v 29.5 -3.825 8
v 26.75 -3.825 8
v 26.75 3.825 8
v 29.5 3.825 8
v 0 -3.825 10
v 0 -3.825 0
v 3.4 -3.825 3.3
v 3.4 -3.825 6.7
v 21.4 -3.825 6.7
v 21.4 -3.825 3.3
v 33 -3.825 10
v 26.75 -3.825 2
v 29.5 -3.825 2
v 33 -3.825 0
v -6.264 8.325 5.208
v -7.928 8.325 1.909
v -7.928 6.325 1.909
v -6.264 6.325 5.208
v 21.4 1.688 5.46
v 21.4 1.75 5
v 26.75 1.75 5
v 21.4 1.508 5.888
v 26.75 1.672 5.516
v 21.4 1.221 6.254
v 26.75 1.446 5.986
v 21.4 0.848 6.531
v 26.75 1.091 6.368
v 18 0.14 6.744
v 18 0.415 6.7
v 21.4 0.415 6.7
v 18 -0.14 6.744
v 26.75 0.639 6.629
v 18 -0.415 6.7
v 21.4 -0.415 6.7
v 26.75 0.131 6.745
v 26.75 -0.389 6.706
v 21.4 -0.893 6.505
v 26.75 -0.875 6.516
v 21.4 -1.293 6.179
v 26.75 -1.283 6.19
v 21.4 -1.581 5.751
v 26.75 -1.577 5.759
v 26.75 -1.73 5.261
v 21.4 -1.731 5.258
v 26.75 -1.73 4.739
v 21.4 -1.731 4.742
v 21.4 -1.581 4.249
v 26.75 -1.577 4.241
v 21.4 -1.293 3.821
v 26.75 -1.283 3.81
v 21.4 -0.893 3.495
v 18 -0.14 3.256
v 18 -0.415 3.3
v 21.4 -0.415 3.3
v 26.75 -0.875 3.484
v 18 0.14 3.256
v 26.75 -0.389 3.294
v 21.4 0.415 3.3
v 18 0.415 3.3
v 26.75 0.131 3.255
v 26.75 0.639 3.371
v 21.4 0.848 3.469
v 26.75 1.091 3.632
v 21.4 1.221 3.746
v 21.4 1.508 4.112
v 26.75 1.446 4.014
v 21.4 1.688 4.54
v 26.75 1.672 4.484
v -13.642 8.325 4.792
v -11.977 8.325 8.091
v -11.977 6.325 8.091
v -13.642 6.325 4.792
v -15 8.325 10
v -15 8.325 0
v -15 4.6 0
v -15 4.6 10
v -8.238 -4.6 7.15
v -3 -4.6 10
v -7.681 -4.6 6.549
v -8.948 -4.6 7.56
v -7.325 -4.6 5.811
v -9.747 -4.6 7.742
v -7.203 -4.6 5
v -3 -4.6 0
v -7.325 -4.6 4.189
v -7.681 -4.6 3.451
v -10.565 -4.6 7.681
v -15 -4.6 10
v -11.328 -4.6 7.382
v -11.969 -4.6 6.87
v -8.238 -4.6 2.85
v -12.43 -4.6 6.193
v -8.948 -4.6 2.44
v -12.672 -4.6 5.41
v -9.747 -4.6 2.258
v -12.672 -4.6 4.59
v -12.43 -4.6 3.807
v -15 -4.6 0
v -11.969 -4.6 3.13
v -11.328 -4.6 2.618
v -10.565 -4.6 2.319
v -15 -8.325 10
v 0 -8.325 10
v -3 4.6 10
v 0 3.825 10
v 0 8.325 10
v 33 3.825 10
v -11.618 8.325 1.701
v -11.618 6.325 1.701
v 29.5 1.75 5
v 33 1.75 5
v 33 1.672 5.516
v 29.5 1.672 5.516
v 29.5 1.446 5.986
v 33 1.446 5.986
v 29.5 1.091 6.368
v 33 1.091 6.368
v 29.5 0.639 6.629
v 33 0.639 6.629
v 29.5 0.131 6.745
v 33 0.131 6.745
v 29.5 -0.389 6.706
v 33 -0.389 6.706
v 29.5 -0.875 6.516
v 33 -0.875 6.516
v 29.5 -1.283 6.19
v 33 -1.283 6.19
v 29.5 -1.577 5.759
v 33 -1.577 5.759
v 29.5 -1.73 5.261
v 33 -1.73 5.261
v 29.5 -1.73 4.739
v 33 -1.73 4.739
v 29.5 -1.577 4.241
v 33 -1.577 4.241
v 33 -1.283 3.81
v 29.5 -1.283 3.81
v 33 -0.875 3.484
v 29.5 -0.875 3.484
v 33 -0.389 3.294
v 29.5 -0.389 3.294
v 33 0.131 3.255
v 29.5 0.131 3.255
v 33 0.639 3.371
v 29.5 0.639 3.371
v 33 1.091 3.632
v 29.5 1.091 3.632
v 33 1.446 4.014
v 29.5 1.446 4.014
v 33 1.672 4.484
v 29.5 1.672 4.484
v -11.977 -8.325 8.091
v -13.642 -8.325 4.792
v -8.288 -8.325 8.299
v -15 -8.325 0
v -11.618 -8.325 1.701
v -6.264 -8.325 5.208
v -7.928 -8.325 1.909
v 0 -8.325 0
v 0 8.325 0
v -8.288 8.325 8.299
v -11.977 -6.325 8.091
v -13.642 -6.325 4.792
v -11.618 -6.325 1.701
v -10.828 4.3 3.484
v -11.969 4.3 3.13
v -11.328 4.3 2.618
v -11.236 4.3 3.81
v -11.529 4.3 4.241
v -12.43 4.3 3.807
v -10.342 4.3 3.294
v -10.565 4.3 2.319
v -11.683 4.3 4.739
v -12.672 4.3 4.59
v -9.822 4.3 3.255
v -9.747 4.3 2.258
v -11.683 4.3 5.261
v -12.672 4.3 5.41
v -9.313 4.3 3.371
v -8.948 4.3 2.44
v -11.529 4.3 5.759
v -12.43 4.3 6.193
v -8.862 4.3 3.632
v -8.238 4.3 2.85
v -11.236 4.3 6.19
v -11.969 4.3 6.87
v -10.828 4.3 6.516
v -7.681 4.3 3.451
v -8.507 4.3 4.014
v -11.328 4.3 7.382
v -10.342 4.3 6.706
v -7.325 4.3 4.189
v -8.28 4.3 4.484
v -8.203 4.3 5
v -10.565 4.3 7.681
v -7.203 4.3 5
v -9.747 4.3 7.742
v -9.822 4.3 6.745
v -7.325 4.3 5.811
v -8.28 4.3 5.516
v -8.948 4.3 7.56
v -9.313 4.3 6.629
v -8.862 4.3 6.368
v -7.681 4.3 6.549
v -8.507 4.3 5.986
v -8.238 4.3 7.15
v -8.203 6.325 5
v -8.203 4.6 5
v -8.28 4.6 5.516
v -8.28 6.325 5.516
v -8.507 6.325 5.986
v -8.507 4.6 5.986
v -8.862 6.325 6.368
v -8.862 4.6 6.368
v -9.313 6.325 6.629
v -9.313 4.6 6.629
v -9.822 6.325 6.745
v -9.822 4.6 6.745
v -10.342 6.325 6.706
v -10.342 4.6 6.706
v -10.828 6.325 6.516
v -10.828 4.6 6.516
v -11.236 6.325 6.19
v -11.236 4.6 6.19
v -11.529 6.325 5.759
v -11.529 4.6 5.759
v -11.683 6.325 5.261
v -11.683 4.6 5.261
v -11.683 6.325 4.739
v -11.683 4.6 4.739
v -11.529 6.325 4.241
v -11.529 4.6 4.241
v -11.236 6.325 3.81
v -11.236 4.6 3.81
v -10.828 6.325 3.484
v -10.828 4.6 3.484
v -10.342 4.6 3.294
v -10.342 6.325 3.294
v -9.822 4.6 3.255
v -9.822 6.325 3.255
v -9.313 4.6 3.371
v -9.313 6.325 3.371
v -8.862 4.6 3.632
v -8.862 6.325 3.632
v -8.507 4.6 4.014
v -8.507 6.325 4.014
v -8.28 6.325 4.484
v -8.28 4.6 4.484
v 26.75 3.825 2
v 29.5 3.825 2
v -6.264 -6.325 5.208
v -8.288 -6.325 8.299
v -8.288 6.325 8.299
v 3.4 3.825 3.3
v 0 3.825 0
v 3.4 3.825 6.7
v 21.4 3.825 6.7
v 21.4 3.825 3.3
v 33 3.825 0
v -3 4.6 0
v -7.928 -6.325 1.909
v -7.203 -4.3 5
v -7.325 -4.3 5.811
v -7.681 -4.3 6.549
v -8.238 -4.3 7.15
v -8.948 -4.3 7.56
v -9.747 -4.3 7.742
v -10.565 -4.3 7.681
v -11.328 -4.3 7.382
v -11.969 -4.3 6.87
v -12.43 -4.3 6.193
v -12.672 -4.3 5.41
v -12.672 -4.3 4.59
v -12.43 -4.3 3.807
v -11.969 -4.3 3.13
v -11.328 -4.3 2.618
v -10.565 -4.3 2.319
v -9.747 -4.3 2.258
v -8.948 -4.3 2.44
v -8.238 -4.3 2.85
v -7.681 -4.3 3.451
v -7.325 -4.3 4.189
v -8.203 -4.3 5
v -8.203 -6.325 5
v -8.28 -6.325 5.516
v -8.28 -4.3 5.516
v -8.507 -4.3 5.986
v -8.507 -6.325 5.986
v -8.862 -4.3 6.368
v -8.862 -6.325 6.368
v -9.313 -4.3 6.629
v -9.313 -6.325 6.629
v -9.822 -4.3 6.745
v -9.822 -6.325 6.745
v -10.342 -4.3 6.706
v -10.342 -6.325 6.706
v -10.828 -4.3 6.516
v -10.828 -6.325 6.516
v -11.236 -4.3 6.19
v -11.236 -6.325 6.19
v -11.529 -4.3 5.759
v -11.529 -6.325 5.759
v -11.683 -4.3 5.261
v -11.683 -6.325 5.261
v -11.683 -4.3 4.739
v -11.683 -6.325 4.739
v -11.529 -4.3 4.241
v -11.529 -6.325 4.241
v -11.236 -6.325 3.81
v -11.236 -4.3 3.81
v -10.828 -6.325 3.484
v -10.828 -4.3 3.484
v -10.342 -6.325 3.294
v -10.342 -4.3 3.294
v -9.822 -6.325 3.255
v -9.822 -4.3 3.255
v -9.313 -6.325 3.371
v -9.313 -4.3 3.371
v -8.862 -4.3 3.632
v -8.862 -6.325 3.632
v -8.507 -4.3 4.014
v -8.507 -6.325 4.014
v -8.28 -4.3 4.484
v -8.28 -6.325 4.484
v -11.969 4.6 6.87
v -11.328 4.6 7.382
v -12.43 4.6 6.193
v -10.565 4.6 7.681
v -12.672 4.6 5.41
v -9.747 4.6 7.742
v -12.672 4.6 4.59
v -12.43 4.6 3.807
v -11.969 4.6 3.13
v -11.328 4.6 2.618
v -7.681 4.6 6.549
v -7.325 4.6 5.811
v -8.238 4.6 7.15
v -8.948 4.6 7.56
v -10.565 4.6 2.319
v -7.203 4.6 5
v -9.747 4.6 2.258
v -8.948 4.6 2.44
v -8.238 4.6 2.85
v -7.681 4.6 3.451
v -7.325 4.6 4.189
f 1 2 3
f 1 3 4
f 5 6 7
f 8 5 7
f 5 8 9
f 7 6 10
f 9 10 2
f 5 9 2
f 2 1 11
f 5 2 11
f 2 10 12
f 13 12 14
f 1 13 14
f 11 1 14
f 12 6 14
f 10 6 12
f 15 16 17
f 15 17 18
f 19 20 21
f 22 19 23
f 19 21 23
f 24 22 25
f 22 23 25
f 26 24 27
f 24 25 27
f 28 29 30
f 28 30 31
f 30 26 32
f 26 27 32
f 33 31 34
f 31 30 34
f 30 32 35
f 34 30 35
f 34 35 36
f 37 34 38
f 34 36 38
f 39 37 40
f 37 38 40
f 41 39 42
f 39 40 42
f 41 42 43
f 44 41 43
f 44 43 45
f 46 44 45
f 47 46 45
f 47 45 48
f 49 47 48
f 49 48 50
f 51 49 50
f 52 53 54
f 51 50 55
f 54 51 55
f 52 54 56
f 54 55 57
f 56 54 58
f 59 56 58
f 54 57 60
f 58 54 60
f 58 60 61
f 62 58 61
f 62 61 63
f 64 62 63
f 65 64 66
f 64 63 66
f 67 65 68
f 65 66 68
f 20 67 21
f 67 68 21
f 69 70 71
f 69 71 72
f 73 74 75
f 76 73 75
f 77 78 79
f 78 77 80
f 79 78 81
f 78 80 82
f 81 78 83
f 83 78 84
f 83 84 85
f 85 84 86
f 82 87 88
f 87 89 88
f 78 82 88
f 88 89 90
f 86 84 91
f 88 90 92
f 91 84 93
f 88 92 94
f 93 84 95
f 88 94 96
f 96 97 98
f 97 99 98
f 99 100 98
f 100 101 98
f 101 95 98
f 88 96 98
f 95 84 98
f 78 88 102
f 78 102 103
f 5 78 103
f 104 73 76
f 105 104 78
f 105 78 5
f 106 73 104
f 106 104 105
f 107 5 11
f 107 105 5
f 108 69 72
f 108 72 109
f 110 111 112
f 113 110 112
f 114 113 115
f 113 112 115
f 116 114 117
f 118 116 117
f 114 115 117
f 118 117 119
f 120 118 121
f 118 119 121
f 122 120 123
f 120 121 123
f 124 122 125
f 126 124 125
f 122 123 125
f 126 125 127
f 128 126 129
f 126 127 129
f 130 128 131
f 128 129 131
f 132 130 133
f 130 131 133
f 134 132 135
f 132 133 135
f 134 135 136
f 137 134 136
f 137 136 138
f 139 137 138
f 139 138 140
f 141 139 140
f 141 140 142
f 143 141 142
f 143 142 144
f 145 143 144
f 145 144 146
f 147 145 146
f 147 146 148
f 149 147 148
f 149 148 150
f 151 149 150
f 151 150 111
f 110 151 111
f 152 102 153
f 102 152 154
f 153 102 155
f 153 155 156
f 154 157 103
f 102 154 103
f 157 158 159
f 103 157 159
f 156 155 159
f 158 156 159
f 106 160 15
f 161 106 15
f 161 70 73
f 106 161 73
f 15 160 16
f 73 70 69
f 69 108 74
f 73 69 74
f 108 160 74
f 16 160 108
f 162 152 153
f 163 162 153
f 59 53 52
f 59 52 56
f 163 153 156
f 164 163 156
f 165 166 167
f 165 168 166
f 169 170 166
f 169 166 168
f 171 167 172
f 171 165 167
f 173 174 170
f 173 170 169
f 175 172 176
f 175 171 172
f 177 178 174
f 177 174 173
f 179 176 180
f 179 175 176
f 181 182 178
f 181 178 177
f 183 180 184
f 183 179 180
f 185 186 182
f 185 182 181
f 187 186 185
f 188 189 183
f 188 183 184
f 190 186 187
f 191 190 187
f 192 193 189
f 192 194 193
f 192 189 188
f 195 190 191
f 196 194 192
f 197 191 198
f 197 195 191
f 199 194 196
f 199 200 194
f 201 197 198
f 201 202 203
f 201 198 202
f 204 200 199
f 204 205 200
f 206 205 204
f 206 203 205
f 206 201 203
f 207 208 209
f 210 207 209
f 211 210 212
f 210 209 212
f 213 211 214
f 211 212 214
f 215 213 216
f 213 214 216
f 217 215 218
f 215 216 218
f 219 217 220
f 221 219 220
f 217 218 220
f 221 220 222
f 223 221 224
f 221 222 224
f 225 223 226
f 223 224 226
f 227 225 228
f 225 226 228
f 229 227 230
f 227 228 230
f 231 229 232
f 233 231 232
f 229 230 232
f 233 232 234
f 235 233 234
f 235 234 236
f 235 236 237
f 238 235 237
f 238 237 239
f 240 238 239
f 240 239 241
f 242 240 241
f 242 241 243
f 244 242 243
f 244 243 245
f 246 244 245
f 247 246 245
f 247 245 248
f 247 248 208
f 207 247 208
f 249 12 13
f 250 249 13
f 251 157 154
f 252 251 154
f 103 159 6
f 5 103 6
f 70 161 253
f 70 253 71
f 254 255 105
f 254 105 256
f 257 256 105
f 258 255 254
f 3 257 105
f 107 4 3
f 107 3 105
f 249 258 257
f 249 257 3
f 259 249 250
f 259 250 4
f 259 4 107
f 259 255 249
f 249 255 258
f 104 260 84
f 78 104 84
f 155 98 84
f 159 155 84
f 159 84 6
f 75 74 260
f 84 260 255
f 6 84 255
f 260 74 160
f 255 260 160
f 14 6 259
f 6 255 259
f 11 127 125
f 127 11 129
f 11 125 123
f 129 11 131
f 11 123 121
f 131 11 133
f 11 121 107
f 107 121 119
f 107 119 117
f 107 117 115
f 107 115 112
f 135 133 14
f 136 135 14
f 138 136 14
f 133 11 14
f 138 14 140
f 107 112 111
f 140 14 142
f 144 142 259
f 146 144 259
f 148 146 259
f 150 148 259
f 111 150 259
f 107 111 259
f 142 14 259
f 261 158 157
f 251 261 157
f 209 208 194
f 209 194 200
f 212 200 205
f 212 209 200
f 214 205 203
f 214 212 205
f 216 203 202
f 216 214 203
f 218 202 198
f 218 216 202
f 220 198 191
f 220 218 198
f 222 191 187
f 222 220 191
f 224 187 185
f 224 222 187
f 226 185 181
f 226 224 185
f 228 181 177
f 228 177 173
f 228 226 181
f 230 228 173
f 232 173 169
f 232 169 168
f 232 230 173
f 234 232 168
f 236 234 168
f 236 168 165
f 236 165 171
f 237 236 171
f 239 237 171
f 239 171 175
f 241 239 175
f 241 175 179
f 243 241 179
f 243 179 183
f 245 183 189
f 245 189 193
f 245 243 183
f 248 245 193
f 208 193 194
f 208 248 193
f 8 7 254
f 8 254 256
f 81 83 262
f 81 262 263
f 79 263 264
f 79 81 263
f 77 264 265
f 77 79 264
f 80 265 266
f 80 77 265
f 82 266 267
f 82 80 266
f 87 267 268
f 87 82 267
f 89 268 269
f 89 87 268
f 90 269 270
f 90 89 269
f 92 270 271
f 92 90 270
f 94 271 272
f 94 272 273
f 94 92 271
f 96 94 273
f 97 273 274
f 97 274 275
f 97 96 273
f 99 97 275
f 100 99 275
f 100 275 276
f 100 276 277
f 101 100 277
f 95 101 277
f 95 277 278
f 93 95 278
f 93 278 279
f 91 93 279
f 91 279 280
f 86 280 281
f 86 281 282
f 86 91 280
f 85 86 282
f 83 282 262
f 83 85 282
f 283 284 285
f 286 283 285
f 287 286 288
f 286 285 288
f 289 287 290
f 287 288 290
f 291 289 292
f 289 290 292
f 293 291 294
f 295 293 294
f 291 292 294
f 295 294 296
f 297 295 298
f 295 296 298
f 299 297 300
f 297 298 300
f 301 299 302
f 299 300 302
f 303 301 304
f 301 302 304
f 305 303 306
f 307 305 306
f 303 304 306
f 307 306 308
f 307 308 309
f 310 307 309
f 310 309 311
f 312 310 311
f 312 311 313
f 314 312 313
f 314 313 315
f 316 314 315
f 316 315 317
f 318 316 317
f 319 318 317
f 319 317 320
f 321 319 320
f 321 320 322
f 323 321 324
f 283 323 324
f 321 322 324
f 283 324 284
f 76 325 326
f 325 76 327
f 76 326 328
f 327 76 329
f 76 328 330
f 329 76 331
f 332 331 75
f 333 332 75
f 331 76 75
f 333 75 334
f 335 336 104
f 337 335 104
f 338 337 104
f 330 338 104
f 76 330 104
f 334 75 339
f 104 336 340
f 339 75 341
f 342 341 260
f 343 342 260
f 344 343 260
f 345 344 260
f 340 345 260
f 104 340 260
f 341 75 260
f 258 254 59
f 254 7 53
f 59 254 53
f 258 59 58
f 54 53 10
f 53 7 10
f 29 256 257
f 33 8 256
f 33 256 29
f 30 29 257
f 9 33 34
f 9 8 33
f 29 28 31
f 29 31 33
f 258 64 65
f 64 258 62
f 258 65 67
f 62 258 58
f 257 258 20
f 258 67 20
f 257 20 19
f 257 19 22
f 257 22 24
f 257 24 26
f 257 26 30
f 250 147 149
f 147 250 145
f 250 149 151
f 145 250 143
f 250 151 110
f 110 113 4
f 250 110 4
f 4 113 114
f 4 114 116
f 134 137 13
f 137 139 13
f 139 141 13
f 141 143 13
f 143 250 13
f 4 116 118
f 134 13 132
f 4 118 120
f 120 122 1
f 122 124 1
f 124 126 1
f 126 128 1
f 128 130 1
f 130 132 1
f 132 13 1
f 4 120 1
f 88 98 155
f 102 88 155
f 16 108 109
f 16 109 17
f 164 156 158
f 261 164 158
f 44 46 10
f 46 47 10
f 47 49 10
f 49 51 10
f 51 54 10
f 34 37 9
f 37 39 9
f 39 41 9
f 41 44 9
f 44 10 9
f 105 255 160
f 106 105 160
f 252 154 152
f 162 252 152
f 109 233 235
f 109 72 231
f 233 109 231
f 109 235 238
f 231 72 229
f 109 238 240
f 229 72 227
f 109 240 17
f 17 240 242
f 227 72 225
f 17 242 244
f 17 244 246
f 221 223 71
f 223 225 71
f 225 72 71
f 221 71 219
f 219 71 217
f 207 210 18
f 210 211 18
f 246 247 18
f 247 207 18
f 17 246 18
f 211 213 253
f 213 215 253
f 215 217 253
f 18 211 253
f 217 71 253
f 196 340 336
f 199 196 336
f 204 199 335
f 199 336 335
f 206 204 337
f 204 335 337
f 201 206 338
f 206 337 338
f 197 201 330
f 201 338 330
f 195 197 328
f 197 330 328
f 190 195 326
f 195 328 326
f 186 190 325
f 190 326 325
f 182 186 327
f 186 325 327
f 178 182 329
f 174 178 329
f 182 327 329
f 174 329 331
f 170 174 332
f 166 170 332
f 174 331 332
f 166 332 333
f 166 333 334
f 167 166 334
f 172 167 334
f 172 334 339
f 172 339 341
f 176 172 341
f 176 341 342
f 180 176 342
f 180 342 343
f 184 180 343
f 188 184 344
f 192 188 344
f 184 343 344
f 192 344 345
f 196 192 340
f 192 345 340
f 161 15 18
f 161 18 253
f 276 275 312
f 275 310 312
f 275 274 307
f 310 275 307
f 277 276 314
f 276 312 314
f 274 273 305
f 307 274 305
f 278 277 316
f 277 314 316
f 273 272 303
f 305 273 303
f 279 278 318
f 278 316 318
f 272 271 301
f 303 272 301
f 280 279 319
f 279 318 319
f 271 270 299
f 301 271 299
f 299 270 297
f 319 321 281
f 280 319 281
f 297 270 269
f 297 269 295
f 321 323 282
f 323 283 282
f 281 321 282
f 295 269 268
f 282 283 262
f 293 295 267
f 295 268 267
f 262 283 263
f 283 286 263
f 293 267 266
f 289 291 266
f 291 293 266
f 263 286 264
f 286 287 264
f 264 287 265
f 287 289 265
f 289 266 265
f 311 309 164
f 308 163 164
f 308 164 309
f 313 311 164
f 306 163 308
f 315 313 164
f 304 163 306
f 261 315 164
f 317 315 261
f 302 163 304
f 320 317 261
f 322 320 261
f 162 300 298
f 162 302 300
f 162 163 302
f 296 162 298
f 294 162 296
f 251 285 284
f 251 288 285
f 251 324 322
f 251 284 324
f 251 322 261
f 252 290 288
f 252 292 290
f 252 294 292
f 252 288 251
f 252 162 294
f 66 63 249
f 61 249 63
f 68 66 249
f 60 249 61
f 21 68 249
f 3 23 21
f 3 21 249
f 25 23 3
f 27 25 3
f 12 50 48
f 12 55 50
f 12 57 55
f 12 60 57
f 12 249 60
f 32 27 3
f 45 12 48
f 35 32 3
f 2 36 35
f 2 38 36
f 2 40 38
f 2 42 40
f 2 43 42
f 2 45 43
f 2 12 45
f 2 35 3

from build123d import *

# Parameters (mm, degrees)
F0_W      = 33
F0_H      = 3.825
F1_DEPTH  = 10
F2_R      = 1.75
F3_DEPTH  = 16.651
F4_W      = 18
F4_H      = 3.4
F4_W_2    = 2.75
F4_H_2    = 6
F5_DEPTH  = 12.151
F6_R      = 1.75
F7_DEPTH  = 15
F10_DEPTH = 2
F11_W     = 17.65
F11_H     = 60
F12_DEPTH = 8
F13_R     = 1.75
F14_DEPTH = 63.001
F15_R     = 2.75
F15_R_2   = 1.75
F16_DEPTH = 0.3
F17_R     = 1.75
F18_DEPTH = 2
F19_R     = 3.75
F20_DEPTH = 4


# Not quite as in the source:
# - a pattern or mirror of a feature is missing from the dataset's text; its kind, count and spacing are read off the source's solid


with BuildPart() as f1:
    # F0 (on Top) → F1 (new body)
    with BuildSketch(Plane.XY):
        Polygon((0, -3.825), (0, 0), (-3, 0), (-3, -4.6), (-15, -4.6), (-15, -8.325), (0, -8.325), align=None)
        Polygon((-3, 0), (0, 0), (0, 3.825), (0, 8.325), (-15, 8.325), (-15, 4.6), (-3, 4.6), align=None)
        with Locations((16.5, 1.9125)):
            Rectangle(F0_W, F0_H)
        with Locations((16.5, -1.9125)):
            Rectangle(F0_W, F0_H)
    extrude(amount=F1_DEPTH)

    # F2 (on face) → F3 (cut, through all)
    with BuildSketch(Plane.XZ.offset(8.325)):
        with Locations((-9.9527407438, 5)):
            Circle(F2_R)
    extrude(amount=-F3_DEPTH, mode=Mode.SUBTRACT)

    # F4 (on face) → F5 (cut, through all)
    with BuildSketch(Plane.XZ.offset(3.825)):
        with Locations((12.4002694301, 5)):
            Rectangle(F4_W, F4_H)
        with Locations((28.125, 5)):
            Rectangle(F4_W_2, F4_H_2)
    extrude(amount=-F5_DEPTH, mode=Mode.SUBTRACT)

    # F6 (on face) → F7 (cut)
    with BuildSketch(Plane.YZ.offset(33)):
        with Locations((0, 5)):
            Circle(F6_R)
    extrude(amount=-F7_DEPTH, mode=Mode.SUBTRACT)

    # F15 (on face) → F16 (join)
    with BuildSketch(Plane.XZ.offset(-4.6)):
        with Locations((-9.9527407438, 5)):
            Circle(F15_R)
        with Locations((-9.9527407438, 5)):
            Circle(F15_R_2, mode=Mode.SUBTRACT)
    f16 = extrude(amount=F16_DEPTH)

    # F16_copies: F16 across plane
    add(f16.mirror(Plane(origin=(0, 0, 0), x_dir=(0, 0, -1), z_dir=(0, -1, 0))))

    # F17 (on face) → F18 (cut)
    with BuildSketch(Plane.XZ.offset(8.325)):
        Polygon((-7.9284293953, 1.9088033227), (-6.2635302189, 5.2075067143), (-8.2878415673, 8.2987033916), (-11.9770520922, 8.0911966773), (-13.6419512686, 4.7924932857), (-11.6176399202, 1.7012966084), align=None)
        with Locations((-9.9527407438, 5)):
            Circle(F17_R, mode=Mode.SUBTRACT)
    f18 = extrude(amount=-F18_DEPTH, mode=Mode.SUBTRACT)

    # F18_copies: F18 across plane
    add(f18.mirror(Plane.ZX), mode=Mode.SUBTRACT)


with BuildPart() as f10:
    # F9 (on offset) → F10 (new body)
    with BuildSketch(Plane.YZ.offset(38)):
        Polygon((3.825, 0), (3.825, 10), (3.825, 19.8484882712), (-3.825, 19.8484882712), (-3.825, 10), (-3.825, 0), (-3.825, -10.1515117288), (3.825, -10.1515117288), align=None)
    extrude(amount=F10_DEPTH)

    # F11 (on face) → F12 (join)
    with BuildSketch(Plane.YZ.offset(40)):
        with Locations((0, 4.8484882712)):
            Rectangle(F11_W, F11_H)
    extrude(amount=F12_DEPTH)

    # F13 (on face) → F14 (cut, through all)
    with BuildSketch(Plane.YZ.offset(48)):
        with Locations((0, 5)):
            Circle(F13_R)
    extrude(amount=-F14_DEPTH, mode=Mode.SUBTRACT)

    # F19 (on face) → F20 (join)
    with BuildSketch(Plane(origin=(40, 0, 0), x_dir=(0, -1, 0), z_dir=(-1, 0, 0))):
        with Locations((0, 28)):
            Circle(F19_R)
        with Locations((0, -18)):
            Circle(F19_R)
    extrude(amount=F20_DEPTH)


solid = f1.part
